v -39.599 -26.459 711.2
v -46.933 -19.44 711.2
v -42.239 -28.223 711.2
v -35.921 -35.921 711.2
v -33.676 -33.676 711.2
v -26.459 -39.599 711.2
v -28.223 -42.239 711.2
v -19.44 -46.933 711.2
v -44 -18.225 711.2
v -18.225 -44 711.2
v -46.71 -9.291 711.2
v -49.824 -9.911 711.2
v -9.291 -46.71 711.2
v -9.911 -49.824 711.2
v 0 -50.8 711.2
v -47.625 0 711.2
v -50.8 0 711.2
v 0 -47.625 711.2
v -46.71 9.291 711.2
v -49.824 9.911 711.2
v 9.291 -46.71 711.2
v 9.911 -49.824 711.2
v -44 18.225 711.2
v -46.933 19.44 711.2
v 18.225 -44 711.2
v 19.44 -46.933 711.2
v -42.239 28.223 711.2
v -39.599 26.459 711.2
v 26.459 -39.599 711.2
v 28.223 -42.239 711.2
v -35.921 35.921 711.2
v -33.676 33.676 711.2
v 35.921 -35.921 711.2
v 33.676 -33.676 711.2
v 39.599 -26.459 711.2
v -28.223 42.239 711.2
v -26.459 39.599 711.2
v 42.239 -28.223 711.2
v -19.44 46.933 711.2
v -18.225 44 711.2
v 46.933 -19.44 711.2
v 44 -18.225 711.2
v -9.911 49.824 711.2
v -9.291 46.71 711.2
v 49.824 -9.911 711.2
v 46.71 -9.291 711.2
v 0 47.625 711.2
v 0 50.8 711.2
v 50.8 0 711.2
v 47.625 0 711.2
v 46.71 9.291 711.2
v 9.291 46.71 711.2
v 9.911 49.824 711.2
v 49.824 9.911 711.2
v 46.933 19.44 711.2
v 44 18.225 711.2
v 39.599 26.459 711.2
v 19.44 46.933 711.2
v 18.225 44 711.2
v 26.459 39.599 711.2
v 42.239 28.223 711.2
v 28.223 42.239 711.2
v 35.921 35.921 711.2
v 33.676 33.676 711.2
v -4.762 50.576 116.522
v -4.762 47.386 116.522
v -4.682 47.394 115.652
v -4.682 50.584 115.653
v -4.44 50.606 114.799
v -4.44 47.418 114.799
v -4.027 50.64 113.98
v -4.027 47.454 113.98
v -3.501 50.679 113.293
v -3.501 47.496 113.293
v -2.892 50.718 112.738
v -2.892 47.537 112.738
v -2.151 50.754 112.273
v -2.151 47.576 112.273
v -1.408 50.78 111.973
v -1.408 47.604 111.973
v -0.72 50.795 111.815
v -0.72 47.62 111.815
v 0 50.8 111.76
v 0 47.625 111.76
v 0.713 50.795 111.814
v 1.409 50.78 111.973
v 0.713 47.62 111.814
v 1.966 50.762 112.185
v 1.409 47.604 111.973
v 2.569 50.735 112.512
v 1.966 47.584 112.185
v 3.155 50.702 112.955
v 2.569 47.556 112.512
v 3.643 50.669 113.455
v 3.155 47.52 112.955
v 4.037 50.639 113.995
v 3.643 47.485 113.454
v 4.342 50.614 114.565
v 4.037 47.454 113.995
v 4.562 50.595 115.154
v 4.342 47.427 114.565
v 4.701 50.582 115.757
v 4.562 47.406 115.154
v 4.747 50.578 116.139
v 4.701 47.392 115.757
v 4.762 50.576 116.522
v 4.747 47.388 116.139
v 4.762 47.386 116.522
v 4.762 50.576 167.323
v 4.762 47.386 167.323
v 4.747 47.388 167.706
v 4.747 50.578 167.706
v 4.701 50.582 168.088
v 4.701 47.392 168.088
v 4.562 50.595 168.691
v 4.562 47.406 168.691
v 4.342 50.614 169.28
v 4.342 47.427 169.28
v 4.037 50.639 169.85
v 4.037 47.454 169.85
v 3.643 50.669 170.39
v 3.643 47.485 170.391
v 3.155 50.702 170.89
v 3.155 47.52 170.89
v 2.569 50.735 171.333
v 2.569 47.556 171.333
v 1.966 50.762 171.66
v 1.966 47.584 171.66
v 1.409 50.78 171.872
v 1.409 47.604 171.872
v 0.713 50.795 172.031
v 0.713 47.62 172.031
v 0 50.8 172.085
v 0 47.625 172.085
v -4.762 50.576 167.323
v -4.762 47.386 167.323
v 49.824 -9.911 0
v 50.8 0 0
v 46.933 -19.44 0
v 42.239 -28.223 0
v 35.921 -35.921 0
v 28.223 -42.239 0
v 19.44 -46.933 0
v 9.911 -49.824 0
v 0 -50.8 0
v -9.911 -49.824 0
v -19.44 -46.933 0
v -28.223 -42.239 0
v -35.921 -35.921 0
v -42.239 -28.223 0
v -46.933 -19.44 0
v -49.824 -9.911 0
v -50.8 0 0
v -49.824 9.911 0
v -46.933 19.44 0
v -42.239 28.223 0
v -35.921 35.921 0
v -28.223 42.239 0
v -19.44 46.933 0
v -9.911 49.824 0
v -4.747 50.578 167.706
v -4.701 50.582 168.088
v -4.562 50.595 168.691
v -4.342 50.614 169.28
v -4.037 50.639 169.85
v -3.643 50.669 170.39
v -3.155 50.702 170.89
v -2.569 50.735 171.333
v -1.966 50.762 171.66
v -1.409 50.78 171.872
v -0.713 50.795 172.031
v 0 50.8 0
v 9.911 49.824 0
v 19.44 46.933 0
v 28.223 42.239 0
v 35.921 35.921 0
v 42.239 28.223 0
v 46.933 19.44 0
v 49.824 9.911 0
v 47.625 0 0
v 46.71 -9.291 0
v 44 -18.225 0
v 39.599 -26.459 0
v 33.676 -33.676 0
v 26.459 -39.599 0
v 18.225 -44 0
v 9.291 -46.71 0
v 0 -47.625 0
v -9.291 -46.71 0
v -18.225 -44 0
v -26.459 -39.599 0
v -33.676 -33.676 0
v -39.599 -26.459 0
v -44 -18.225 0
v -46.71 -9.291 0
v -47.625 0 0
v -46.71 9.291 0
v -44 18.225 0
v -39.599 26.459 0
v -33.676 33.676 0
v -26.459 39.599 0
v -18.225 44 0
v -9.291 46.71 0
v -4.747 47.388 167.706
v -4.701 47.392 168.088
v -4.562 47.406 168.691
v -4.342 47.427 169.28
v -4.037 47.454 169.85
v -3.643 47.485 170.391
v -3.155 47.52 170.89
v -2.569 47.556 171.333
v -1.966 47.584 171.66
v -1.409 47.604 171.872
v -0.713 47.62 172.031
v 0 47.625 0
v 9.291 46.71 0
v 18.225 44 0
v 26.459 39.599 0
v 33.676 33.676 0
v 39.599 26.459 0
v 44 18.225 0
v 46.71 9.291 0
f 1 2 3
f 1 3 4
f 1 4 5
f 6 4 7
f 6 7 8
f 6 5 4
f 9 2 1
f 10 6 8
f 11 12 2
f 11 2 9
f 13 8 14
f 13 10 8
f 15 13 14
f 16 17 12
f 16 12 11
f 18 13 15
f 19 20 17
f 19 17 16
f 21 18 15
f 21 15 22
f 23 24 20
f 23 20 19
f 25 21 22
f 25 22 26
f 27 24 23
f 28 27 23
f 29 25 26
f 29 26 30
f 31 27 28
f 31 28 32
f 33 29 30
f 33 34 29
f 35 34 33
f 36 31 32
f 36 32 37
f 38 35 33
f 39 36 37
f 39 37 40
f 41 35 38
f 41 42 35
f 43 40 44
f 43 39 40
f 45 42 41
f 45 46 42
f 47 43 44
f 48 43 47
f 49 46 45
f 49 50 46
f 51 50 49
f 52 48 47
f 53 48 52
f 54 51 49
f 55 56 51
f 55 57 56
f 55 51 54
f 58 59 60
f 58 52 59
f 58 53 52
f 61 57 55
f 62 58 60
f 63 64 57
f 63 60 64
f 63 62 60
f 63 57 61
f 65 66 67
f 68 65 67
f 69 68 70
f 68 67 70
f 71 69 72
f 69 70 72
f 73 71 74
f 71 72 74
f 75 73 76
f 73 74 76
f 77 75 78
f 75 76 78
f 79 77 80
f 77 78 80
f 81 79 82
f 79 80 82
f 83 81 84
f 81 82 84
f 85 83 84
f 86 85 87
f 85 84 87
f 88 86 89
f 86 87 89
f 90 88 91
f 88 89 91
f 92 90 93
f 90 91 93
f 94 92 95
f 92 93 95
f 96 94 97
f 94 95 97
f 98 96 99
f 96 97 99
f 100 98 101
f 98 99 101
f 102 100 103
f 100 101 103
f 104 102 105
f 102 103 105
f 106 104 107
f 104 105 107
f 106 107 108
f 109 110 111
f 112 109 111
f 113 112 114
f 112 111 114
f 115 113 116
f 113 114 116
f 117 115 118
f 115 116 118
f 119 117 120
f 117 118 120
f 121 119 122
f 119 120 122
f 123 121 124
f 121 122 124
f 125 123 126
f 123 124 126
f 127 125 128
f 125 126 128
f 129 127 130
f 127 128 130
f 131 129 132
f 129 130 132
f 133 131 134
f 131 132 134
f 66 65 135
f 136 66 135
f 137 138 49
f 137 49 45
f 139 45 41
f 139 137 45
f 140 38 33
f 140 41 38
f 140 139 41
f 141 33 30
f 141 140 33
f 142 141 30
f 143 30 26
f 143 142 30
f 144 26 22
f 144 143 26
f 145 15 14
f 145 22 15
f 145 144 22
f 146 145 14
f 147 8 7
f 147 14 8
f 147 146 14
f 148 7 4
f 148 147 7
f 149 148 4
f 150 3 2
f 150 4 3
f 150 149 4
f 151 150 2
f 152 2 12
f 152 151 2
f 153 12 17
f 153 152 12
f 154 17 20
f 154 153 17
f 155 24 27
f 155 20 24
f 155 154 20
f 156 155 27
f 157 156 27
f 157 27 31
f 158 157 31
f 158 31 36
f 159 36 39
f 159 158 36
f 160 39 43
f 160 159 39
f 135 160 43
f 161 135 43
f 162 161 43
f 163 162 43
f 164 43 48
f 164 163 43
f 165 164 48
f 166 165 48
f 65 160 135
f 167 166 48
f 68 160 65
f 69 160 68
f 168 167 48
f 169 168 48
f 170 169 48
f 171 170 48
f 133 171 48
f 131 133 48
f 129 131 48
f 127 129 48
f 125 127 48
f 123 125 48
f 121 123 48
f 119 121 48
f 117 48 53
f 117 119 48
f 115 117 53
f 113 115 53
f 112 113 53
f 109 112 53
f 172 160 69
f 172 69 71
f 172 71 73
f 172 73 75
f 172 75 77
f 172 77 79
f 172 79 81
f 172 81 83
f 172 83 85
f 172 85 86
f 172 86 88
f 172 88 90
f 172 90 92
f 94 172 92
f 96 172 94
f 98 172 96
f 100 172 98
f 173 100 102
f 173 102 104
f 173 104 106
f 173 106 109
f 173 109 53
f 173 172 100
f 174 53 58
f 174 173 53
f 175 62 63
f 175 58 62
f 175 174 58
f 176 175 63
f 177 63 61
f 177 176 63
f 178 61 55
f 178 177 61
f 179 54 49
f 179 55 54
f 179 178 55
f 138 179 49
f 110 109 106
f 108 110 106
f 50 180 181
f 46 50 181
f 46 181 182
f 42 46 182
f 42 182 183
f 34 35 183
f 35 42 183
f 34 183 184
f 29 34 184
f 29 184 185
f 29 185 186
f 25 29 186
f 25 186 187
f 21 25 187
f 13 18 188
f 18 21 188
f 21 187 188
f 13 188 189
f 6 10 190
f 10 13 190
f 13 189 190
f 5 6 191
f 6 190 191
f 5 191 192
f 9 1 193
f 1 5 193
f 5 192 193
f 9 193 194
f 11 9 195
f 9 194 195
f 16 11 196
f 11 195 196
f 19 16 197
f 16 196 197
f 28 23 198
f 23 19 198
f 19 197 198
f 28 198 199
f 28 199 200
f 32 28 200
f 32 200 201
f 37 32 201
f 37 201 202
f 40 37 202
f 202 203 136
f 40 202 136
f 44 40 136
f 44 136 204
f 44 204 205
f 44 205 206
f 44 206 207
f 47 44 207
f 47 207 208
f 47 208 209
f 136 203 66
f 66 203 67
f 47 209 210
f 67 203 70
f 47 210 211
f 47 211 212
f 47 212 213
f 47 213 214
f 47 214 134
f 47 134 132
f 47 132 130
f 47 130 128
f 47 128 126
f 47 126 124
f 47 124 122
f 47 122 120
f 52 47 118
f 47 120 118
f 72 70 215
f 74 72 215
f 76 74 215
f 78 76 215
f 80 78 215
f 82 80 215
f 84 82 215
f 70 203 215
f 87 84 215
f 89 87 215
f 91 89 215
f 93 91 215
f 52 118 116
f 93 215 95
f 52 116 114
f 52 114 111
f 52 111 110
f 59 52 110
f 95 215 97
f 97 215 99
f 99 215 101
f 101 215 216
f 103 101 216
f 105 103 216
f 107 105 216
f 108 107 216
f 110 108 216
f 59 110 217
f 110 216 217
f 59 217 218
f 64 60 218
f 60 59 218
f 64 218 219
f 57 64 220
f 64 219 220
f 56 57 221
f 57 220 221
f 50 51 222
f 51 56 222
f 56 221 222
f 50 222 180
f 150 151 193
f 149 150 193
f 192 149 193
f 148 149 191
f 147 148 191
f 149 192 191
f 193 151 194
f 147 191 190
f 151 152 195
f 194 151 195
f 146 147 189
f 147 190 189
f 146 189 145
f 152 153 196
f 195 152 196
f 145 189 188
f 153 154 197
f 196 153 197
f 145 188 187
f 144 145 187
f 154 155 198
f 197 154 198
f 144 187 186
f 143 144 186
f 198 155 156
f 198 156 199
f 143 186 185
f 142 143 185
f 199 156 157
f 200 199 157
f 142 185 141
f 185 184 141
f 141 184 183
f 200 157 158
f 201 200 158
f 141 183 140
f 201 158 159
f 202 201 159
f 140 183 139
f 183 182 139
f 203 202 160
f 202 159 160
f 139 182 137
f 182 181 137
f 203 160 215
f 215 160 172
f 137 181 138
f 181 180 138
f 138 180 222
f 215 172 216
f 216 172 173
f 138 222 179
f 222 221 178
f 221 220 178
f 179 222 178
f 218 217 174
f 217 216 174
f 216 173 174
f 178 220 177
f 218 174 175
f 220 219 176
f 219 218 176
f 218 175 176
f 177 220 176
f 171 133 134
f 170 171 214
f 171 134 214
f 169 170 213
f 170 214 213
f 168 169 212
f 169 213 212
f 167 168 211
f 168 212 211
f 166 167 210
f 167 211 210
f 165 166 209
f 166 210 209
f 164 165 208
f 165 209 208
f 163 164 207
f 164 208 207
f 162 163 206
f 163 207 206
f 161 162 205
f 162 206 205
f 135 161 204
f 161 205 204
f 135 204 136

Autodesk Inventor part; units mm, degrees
ref_plane "YZ Plane" through (0, 0, 0) normal (1, 0, 0) x (0, 1, 0)
ref_plane "XY Plane" through (0, 0, 0) normal (0, 0, 1) x (1, 0, 0)
sketch "Sketch1" plane through (0, 0, 0) normal (0, 0, 1) x (1, 0, 0)
  circle A0 centre (0, 0) radius 50.8
  circle A1 centre (0, 0) radius 47.625
  dimension "d0" = 101.6
  dimension "d1" = 95.25
extrude "Extrusion1" add sketch "Sketch1" along normal blind 711.2
ref_plane "Work Plane1" through (0, 50.8, 0) normal (0, 1, 0) x (-1, 0, 0)
sketch "Sketch3" plane through (0, 50.8, 0) normal (0, 1, 0) x (-1, 0, 0)
  line L0 (0, 0) -> (0, 111.76)
  line L1 (-4.7625, 111.76) -> (4.7625, 111.76)
  line L2 (4.7625, 111.76) -> (4.7625, 172.085)
  line L3 (4.7625, 172.085) -> (-4.7625, 172.085)
  line L4 (-4.7625, 172.085) -> (-4.7625, 111.76)
  dimension "d4" = 111.76
  dimension "d5" = 60.325
  dimension "d6" = 9.525
  dimension "d7" = 4.7625
extrude "Extrusion2" cut sketch "Sketch3" against normal blind 25.4
fillet "Fillet1" radius 4.7625 4 edges at (-4.7625, 48.9813, 111.76) (4.7625, 48.9813, 111.76) (4.7625, 48.9813, 172.085) (-4.7625, 48.9813, 172.085)
equation "\"d7\" = 0.5 * d6"
properties part number "PrimaryHullLexanTube_01" material "Polycarbonate, Clear"
